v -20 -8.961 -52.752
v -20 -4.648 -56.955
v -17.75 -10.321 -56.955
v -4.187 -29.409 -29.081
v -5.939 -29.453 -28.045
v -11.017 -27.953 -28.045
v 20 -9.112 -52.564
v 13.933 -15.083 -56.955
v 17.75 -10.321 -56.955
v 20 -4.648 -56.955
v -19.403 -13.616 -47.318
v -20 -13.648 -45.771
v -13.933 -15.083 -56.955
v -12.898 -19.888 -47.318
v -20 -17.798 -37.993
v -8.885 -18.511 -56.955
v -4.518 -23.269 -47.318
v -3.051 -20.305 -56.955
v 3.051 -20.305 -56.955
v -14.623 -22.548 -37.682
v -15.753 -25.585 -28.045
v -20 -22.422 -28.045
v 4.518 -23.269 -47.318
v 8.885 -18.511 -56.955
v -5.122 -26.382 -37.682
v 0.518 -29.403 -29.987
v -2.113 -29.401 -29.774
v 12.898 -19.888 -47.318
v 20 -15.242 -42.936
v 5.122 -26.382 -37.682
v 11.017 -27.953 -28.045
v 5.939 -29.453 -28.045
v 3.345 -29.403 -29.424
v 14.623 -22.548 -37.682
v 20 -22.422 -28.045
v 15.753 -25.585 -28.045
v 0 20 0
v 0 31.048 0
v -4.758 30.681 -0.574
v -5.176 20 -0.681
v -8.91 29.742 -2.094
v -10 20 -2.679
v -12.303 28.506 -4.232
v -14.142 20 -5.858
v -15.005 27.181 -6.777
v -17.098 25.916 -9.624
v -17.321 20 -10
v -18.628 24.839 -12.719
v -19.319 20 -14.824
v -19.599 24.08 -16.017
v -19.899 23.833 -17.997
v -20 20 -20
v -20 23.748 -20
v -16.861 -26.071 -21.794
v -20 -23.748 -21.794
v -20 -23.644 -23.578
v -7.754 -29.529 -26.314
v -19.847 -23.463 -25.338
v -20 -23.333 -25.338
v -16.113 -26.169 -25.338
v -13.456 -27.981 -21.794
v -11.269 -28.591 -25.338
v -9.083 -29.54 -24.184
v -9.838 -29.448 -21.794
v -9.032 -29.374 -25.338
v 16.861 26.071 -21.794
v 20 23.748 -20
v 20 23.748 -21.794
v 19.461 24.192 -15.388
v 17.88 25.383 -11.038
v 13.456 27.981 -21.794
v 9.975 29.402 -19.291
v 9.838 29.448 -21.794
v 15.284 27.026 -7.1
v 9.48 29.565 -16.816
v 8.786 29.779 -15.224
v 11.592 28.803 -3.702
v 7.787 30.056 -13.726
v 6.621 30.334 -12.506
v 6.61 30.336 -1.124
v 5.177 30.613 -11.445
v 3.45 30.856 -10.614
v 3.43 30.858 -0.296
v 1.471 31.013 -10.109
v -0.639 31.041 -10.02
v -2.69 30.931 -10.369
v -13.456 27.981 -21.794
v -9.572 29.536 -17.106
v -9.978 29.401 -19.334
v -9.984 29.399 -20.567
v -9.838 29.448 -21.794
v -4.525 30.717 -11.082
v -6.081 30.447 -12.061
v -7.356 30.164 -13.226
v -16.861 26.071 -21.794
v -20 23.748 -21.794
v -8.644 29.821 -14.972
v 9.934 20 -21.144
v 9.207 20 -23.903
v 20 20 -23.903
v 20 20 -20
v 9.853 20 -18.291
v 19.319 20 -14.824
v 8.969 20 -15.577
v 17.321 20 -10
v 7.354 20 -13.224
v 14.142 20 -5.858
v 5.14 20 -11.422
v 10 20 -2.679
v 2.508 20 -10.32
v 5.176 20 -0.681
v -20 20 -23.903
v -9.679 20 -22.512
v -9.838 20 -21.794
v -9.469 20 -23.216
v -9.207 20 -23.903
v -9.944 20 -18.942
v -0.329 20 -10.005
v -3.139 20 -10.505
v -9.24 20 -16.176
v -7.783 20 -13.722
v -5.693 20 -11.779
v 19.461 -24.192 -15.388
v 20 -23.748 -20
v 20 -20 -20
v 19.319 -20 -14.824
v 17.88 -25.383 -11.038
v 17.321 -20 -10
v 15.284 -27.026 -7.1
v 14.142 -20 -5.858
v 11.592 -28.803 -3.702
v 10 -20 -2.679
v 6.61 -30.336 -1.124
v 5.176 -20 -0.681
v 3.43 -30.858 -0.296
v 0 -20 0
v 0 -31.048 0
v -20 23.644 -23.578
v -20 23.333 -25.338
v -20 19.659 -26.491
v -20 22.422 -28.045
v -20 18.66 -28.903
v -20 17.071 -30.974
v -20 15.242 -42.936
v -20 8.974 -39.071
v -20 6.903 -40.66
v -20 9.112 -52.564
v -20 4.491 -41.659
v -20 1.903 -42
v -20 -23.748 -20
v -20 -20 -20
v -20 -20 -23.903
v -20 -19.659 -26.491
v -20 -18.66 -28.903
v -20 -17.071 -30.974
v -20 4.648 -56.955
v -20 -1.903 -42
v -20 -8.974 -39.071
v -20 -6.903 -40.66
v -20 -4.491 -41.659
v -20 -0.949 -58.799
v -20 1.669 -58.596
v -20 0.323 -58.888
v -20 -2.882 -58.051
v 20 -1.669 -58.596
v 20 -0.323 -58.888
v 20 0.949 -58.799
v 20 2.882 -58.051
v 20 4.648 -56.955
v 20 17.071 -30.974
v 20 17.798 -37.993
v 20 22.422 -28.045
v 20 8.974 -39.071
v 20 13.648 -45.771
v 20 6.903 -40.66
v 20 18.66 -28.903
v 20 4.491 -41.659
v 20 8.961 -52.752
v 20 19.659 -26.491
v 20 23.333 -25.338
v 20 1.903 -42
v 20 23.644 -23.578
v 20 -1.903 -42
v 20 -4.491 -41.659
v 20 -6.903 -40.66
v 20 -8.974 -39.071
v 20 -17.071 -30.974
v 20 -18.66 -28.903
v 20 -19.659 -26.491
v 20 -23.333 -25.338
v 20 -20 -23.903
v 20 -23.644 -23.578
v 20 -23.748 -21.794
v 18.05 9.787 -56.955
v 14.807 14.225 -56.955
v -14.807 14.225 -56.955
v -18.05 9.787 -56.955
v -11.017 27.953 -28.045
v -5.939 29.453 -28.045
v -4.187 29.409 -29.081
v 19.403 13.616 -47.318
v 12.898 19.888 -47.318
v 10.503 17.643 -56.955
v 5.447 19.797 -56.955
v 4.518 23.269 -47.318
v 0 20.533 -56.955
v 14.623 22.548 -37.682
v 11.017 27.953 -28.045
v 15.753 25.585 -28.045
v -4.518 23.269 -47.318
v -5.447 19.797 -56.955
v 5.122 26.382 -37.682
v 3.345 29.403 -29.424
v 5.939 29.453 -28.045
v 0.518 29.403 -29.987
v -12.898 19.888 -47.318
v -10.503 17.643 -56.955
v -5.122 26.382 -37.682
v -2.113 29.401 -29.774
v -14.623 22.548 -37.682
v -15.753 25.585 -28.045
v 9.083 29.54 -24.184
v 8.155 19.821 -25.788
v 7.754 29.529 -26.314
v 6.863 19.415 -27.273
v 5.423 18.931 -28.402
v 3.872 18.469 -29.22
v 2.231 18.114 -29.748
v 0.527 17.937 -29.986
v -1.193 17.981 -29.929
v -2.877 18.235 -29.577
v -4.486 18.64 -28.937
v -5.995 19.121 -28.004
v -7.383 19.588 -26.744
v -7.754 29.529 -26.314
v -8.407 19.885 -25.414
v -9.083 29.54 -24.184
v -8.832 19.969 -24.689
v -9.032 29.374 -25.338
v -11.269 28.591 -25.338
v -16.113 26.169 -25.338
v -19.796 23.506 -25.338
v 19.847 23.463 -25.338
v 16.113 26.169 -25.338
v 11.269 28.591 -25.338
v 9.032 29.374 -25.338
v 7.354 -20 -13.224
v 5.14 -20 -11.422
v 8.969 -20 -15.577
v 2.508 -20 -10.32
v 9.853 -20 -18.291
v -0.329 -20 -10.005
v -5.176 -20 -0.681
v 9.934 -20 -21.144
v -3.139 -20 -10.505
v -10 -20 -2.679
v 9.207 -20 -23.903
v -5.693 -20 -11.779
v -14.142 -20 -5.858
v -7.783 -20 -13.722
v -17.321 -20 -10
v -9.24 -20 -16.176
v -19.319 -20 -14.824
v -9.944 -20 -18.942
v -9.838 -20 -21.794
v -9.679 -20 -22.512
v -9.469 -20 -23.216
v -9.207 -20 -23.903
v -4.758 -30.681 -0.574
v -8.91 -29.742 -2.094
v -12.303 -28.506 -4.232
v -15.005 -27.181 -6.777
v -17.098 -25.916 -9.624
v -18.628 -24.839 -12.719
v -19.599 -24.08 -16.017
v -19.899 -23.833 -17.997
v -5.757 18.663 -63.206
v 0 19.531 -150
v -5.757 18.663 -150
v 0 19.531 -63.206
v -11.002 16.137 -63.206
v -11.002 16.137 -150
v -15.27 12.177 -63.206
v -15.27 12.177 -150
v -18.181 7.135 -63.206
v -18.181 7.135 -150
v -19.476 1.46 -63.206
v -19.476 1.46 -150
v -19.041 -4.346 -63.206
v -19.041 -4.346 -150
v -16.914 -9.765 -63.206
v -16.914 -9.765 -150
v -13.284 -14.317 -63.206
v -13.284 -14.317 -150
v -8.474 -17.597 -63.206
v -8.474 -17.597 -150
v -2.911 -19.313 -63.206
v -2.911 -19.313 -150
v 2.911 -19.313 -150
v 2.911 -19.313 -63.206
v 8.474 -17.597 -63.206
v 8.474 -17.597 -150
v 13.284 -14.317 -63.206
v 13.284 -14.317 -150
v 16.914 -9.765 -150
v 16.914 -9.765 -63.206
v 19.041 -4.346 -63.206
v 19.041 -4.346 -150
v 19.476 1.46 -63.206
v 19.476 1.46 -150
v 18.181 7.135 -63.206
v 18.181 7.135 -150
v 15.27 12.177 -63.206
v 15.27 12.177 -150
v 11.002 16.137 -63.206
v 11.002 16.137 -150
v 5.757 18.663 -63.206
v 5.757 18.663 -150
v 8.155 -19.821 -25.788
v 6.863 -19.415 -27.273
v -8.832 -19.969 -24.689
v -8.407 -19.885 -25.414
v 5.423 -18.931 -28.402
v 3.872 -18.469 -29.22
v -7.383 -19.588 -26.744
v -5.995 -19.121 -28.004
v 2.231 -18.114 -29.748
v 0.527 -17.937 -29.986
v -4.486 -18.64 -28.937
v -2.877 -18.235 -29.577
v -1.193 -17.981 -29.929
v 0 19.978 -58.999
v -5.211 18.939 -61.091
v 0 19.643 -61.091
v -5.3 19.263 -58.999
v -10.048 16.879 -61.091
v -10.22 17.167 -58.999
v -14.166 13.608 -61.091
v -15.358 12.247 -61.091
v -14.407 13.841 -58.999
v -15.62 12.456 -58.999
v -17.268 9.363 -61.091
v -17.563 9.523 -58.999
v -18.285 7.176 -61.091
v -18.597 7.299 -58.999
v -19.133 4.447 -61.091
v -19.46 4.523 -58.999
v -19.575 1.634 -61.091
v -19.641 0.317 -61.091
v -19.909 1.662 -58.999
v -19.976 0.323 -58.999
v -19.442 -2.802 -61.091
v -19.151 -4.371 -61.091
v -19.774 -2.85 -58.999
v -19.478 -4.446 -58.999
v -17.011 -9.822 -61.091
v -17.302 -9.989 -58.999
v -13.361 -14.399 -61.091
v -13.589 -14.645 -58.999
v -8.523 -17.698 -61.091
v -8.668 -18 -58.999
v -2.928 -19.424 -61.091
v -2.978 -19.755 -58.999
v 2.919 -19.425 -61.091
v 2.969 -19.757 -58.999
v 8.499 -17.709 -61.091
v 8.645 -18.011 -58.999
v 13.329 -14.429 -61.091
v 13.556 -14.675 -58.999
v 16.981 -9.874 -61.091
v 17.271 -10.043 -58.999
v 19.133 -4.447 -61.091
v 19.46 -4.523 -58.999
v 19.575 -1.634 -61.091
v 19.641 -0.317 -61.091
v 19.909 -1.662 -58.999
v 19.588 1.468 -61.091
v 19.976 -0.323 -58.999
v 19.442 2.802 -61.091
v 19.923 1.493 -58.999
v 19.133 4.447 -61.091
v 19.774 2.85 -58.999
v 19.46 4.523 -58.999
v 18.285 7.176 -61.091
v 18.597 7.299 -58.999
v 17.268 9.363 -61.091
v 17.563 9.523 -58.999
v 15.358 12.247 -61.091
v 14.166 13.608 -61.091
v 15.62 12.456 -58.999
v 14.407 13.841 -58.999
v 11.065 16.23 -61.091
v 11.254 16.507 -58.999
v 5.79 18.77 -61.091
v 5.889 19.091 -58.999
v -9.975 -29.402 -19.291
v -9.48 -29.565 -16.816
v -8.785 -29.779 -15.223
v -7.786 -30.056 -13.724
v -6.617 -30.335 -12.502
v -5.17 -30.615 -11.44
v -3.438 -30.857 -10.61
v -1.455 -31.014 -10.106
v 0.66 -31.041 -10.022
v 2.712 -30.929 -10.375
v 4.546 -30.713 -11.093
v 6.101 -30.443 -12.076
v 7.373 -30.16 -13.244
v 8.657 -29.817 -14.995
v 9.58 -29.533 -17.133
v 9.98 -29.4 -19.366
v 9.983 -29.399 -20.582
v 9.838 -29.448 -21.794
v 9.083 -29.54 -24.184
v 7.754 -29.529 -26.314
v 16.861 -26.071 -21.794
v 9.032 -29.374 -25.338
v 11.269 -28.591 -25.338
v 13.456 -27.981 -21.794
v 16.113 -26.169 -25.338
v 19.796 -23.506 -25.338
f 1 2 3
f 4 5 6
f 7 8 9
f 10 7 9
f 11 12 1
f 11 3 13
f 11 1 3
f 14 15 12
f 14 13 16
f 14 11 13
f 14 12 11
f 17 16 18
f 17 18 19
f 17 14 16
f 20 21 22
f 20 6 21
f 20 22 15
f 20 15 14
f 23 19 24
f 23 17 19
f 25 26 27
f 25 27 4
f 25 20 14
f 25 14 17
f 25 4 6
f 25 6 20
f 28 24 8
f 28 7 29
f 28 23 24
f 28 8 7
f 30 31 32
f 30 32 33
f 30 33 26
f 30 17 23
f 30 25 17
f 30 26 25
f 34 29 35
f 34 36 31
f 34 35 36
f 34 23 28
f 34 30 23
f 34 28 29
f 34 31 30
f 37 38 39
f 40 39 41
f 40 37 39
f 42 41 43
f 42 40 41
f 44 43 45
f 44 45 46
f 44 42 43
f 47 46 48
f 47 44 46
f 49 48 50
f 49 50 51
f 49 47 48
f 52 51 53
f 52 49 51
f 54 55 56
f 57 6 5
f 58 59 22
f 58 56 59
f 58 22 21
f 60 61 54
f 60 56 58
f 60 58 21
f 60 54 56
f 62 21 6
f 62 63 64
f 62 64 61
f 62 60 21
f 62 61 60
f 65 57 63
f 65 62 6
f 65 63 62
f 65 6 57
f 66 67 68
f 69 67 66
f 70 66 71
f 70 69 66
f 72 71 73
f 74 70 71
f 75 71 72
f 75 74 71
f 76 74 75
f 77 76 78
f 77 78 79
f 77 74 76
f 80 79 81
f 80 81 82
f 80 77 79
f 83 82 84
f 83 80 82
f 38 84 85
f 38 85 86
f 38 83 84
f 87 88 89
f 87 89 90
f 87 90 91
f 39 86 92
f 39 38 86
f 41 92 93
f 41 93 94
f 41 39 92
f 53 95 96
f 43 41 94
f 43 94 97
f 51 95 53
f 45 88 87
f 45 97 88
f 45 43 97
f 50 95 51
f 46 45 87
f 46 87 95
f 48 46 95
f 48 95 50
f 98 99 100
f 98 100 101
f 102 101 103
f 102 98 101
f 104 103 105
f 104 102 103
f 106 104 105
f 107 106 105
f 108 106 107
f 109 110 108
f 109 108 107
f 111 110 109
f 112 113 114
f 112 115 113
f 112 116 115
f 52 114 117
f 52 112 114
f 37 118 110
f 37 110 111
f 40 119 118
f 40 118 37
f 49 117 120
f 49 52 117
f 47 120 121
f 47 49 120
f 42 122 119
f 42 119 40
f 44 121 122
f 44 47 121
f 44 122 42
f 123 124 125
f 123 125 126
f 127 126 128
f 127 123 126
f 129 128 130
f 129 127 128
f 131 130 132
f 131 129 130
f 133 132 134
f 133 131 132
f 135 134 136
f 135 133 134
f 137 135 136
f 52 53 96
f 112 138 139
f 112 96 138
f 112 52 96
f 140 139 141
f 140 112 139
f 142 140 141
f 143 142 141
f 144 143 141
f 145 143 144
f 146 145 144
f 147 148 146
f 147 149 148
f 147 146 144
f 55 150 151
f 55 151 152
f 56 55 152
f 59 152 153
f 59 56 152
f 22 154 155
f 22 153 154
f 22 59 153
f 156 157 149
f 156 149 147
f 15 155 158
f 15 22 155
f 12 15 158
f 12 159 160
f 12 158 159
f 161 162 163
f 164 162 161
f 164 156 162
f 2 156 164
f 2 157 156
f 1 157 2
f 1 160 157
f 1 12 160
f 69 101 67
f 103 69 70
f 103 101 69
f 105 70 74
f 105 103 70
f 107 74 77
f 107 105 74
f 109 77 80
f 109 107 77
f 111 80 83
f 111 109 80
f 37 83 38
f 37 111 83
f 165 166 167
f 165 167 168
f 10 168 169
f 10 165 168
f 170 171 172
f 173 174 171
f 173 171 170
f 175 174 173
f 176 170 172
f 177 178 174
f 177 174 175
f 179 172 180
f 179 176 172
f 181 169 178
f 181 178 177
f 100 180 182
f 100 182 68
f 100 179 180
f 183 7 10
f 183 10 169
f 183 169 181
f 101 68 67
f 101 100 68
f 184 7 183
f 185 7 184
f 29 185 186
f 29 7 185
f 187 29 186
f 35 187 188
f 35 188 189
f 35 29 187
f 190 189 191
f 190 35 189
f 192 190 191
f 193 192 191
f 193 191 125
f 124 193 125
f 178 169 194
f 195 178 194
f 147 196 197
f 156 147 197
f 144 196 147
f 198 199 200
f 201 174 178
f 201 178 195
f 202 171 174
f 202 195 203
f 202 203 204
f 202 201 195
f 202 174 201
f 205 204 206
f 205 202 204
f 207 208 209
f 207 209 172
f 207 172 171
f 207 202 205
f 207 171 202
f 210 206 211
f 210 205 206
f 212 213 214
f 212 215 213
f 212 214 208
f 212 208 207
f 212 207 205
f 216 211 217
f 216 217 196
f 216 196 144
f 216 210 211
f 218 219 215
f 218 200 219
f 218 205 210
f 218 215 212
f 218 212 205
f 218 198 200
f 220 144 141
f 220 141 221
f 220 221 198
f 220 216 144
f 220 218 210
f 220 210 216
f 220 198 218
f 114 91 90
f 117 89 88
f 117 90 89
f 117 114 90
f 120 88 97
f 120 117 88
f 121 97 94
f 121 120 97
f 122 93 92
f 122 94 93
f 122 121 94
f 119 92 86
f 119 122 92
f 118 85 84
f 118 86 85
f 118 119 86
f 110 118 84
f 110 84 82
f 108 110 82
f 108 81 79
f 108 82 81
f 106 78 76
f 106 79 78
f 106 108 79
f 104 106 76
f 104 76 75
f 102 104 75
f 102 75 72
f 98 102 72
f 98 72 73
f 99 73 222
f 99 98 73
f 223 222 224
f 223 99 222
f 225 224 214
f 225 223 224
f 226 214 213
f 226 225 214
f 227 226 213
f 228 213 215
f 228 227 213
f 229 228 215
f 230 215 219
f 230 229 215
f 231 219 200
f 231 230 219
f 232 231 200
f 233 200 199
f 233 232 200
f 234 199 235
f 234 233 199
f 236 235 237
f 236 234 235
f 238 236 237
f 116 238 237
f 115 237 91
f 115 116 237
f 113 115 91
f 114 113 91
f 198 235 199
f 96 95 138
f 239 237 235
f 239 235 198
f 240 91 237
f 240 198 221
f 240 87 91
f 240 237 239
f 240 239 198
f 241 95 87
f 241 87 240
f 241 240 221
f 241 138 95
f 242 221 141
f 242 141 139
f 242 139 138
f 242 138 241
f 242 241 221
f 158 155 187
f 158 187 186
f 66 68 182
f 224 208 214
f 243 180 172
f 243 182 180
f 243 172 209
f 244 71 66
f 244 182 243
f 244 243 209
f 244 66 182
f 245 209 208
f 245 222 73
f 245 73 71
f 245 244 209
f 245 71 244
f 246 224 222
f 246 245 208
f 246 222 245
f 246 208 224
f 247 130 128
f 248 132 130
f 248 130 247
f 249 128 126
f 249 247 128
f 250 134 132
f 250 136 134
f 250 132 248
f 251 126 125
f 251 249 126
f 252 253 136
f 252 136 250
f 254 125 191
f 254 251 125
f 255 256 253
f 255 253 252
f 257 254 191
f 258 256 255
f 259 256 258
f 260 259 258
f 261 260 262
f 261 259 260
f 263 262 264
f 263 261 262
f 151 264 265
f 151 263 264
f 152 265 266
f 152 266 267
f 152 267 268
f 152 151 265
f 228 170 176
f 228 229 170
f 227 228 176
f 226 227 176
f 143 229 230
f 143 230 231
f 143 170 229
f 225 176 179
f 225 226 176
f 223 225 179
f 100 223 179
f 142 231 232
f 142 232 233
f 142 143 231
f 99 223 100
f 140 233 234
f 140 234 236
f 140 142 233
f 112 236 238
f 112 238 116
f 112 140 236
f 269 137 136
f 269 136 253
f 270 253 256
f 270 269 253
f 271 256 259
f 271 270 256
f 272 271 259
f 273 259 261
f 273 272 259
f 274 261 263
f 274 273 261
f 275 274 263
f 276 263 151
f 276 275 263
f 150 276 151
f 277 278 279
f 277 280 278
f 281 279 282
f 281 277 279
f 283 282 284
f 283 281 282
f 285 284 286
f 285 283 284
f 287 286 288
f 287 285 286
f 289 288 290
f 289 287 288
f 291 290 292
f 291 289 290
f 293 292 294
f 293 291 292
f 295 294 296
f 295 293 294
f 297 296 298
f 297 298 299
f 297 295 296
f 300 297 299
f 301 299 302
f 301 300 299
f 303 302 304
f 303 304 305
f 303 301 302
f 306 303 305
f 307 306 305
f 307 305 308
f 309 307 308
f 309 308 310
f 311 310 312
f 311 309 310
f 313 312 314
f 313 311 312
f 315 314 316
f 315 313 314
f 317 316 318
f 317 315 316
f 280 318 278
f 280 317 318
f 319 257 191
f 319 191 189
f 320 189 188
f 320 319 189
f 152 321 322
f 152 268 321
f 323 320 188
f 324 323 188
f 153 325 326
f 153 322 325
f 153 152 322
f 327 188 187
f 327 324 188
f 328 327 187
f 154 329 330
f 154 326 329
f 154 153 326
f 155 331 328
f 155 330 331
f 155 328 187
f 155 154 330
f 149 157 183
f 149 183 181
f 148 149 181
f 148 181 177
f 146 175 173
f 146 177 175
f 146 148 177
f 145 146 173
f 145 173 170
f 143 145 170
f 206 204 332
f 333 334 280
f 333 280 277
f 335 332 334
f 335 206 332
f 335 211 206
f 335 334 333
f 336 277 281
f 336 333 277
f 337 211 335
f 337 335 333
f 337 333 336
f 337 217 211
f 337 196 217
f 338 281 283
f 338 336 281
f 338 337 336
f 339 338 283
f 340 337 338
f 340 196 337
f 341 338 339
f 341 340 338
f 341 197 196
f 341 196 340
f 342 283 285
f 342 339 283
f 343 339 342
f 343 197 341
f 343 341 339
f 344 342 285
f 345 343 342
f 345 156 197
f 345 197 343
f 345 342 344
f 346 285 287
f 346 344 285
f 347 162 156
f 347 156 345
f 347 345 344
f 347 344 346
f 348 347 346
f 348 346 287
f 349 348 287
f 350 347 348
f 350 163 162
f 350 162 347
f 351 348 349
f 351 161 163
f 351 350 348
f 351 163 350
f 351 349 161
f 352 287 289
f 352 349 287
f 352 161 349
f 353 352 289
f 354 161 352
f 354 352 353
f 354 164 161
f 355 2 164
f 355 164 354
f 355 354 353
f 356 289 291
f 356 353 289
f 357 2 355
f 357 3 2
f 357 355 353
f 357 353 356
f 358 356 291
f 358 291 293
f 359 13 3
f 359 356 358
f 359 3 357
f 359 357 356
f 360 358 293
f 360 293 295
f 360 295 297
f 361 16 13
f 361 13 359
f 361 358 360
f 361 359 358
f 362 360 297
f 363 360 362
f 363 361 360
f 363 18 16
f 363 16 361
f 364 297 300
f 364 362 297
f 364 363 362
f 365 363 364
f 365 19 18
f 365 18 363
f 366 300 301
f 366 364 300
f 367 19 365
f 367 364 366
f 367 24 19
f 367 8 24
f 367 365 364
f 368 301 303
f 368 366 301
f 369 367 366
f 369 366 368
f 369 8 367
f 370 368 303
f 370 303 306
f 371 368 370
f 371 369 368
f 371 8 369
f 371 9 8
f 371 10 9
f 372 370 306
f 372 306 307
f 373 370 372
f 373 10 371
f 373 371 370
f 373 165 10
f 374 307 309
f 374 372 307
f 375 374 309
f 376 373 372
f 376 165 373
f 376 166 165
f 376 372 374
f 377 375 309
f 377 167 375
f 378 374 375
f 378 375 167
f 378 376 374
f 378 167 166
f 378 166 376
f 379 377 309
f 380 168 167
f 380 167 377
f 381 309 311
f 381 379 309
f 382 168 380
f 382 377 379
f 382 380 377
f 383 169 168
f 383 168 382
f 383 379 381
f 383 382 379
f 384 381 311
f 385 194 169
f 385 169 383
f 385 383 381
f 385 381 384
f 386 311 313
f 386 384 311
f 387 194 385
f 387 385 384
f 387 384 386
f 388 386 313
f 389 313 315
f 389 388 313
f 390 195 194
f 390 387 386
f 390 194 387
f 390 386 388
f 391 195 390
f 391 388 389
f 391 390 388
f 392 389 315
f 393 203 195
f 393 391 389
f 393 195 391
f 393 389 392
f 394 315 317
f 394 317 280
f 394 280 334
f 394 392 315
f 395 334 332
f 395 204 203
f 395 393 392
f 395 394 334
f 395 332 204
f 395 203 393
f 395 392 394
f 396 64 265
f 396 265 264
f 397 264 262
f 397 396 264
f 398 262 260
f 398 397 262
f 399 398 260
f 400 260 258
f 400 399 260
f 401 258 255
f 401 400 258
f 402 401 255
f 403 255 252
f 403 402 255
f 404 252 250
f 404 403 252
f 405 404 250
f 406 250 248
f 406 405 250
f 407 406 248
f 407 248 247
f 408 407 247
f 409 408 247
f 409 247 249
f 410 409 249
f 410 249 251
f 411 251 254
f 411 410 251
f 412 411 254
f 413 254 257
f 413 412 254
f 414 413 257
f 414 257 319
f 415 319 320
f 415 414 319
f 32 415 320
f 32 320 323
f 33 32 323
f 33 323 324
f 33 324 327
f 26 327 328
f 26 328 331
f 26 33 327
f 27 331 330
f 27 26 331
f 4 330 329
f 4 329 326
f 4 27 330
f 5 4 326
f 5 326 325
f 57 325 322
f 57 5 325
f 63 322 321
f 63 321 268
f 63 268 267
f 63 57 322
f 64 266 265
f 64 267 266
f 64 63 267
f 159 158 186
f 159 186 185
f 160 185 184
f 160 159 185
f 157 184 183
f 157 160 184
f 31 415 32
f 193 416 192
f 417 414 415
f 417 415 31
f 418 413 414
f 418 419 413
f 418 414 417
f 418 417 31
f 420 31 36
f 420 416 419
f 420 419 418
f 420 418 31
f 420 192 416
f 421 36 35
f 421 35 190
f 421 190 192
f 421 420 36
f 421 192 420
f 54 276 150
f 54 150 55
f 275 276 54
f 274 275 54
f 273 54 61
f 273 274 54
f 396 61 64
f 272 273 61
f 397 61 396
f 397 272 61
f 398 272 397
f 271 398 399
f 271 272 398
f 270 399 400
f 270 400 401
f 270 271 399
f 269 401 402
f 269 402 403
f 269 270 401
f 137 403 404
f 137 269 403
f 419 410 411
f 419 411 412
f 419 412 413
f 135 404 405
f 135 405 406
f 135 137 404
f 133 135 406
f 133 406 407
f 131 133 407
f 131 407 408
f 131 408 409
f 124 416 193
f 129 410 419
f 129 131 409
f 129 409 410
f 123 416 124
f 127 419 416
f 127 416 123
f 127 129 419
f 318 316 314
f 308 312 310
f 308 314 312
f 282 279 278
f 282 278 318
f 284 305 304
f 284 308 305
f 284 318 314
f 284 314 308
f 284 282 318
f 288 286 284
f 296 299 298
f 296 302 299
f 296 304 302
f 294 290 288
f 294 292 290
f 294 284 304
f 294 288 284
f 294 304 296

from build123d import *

# Parameters (mm, degrees)
CUT_EXTRUDE1_DEPTH      = 157.294477939
CUT_EXTRUDE1_DEPTH_BACK = 157.294477939
CUT_EXTRUDE3_DEPTH      = 156.280037628
CUT_EXTRUDE3_DEPTH_BACK = 156.280037628
CUT_EXTRUDE4_DEPTH      = 155.479713623
CUT_EXTRUDE4_DEPTH_BACK = 155.479713623
SKETCH4_R               = 10


with BuildPart() as part:
    # Sketch1 → Revolve1 (revolve)
    with BuildSketch(Plane(origin=(0, 0, 0), x_dir=(0, 0, -1), z_dir=(1, 0, 0))):
        with BuildLine():
            Line((0, 31.048058087), (0, 0))
            Line((0, 0), (150, 0))
            Line((150, 0), (150, 19.53096248))
            Line((150, 19.53096248), (63.206041057, 19.53096248))
            ThreePointArc((63.206041057, 19.53096248), (60.040415158, 19.783081261), (56.954600633, 20.533081214))
            Line((56.954600633, 20.533081214), (28.045399367, 30.045939353))
            ThreePointArc((28.045399367, 30.045939353), (24.959584842, 30.795939306), (21.793958943, 31.048058087))
            Line((21.793958943, 31.048058087), (0, 31.048058087))
        make_face()
    revolve(axis=Axis((0, 0, -150), (0, 0, 1)))

    # Sketch2 → Cut-Extrude1 (cut, two sides: drawn at the far end of the back side and taken through both)
    with BuildSketch(Plane(origin=(0, 0, 0), x_dir=(0, 0, -1), z_dir=(1, 0, 0)).offset(-CUT_EXTRUDE1_DEPTH_BACK)):
        with BuildLine():
            Line((0, 20), (0, -20))
            Line((0, -20), (23.903263743, -20))
            ThreePointArc((23.903263743, -20), (27.730098067, -19.238795325), (30.974331555, -17.071067812))
            Line((30.974331555, -17.071067812), (39.071067812, -8.974331555))
            ThreePointArc((39.071067812, -8.974331555), (41.238795325, -5.730098067), (42, -1.903263743))
            Line((42, -1.903263743), (42, 1.903263743))
            ThreePointArc((42, 1.903263743), (41.238795325, 5.730098067), (39.071067812, 8.974331555))
            Line((39.071067812, 8.974331555), (30.974331555, 17.071067812))
            ThreePointArc((30.974331555, 17.071067812), (27.730098067, 19.238795325), (23.903263743, 20))
            Line((23.903263743, 20), (0, 20))
        make_face()
    extrude(amount=CUT_EXTRUDE1_DEPTH + CUT_EXTRUDE1_DEPTH_BACK, mode=Mode.SUBTRACT)

    # Sketch3 → Cut-Extrude3 (cut, two sides: drawn at the far end of the back side and taken through both)
    with BuildSketch(Plane(origin=(0, 0, 0), x_dir=(1, 0, 0), z_dir=(0, 1, 0)).offset(-CUT_EXTRUDE3_DEPTH_BACK)):
        with BuildLine():
            ThreePointArc((0, 0), (-14.142135624, 5.857864376), (-20, 20))
            Line((-20, 20), (-20, 58.900056316))
            Line((-20, 58.900056316), (-33.967415872, 58.900056316))
            Line((-33.967415872, 58.900056316), (-33.967415872, 0))
            Line((-33.967415872, 0), (0, 0))
        make_face()
        with BuildLine():
            ThreePointArc((20, 20), (14.142135624, 5.857864376), (0, 0))
            Line((0, 0), (30.596408204, 0))
            Line((30.596408204, 0), (30.596408204, 58.900056316))
            Line((30.596408204, 58.900056316), (20, 58.900056316))
            Line((20, 58.900056316), (20, 20))
        make_face()
    extrude(amount=CUT_EXTRUDE3_DEPTH + CUT_EXTRUDE3_DEPTH_BACK, mode=Mode.SUBTRACT)

    # Sketch4 → Cut-Extrude4 (cut, two sides: drawn at the far end of the back side and taken through both)
    with BuildSketch(Plane(origin=(0, 0, 0), x_dir=(1, 0, 0), z_dir=(0, 1, 0)).offset(-CUT_EXTRUDE4_DEPTH_BACK)):
        with Locations(Location((0, 20, 0), (0, 0, 169.665425663))):
            Circle(SKETCH4_R)
    extrude(amount=CUT_EXTRUDE4_DEPTH + CUT_EXTRUDE4_DEPTH_BACK, mode=Mode.SUBTRACT)


solid = part.part
